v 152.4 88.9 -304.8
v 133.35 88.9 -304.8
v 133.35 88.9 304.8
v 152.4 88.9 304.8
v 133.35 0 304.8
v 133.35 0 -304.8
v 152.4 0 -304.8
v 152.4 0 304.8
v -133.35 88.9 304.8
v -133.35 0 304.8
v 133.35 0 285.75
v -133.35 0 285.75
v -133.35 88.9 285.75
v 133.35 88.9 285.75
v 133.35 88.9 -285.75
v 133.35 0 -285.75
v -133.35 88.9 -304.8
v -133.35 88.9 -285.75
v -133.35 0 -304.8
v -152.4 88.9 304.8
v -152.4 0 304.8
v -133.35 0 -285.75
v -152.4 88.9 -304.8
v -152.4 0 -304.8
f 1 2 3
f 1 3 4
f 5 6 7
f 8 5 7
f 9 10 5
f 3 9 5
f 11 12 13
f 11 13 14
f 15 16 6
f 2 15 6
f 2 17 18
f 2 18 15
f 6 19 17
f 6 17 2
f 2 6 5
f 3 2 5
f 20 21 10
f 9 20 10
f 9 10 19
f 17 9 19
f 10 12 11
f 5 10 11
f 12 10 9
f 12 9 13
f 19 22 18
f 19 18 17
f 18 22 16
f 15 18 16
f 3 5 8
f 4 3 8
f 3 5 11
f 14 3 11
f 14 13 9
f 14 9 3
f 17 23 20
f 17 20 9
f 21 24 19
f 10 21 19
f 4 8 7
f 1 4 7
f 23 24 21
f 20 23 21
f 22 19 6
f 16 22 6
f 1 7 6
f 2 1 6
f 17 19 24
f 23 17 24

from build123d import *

# Parameters (mm, degrees)
SKETCH1_W             = 19.05
SKETCH1_H             = 609.6
BOSS_EXTRUDE1_DEPTH   = 88.9
BOSS_EXTRUDE1_2_DEPTH = 88.9
SKETCH1_5_W           = 266.7
SKETCH1_5_H           = 19.05
BOSS_EXTRUDE2_DEPTH   = 88.9
BOSS_EXTRUDE2_2_DEPTH = 88.9


with BuildPart() as part:
    # Sketch1 → Boss-Extrude1 (new body)
    with BuildSketch(Plane(origin=(0, 0, 0), x_dir=(1, 0, 0), z_dir=(0, 1, 0))):
        with Locations((-142.875, 0)):
            Rectangle(SKETCH1_W, SKETCH1_H)
    extrude(amount=BOSS_EXTRUDE1_DEPTH)


with BuildPart() as body_2:
    # Sketch1 → Boss-Extrude1 2 (new body)
    with BuildSketch(Plane(origin=(0, 0, 0), x_dir=(1, 0, 0), z_dir=(0, 1, 0))):
        with Locations((142.875, 0)):
            Rectangle(SKETCH1_W, SKETCH1_H)
    extrude(amount=BOSS_EXTRUDE1_2_DEPTH)


with BuildPart() as body_3:
    # Sketch1<5> → Boss-Extrude2 (new body)
    with BuildSketch(Plane(origin=(0, 0, 0), x_dir=(1, 0, 0), z_dir=(0, 1, 0))):
        with Locations((0, 295.275)):
            Rectangle(SKETCH1_5_W, SKETCH1_5_H)
    extrude(amount=BOSS_EXTRUDE2_DEPTH)


with BuildPart() as body_4:
    # Sketch1<5> → Boss-Extrude2 2 (new body)
    with BuildSketch(Plane(origin=(0, 0, 0), x_dir=(1, 0, 0), z_dir=(0, 1, 0))):
        with Locations((0, -295.275)):
            Rectangle(SKETCH1_5_W, SKETCH1_5_H)
    extrude(amount=BOSS_EXTRUDE2_2_DEPTH)


solid = Compound([part.part, body_2.part, body_3.part, body_4.part])
